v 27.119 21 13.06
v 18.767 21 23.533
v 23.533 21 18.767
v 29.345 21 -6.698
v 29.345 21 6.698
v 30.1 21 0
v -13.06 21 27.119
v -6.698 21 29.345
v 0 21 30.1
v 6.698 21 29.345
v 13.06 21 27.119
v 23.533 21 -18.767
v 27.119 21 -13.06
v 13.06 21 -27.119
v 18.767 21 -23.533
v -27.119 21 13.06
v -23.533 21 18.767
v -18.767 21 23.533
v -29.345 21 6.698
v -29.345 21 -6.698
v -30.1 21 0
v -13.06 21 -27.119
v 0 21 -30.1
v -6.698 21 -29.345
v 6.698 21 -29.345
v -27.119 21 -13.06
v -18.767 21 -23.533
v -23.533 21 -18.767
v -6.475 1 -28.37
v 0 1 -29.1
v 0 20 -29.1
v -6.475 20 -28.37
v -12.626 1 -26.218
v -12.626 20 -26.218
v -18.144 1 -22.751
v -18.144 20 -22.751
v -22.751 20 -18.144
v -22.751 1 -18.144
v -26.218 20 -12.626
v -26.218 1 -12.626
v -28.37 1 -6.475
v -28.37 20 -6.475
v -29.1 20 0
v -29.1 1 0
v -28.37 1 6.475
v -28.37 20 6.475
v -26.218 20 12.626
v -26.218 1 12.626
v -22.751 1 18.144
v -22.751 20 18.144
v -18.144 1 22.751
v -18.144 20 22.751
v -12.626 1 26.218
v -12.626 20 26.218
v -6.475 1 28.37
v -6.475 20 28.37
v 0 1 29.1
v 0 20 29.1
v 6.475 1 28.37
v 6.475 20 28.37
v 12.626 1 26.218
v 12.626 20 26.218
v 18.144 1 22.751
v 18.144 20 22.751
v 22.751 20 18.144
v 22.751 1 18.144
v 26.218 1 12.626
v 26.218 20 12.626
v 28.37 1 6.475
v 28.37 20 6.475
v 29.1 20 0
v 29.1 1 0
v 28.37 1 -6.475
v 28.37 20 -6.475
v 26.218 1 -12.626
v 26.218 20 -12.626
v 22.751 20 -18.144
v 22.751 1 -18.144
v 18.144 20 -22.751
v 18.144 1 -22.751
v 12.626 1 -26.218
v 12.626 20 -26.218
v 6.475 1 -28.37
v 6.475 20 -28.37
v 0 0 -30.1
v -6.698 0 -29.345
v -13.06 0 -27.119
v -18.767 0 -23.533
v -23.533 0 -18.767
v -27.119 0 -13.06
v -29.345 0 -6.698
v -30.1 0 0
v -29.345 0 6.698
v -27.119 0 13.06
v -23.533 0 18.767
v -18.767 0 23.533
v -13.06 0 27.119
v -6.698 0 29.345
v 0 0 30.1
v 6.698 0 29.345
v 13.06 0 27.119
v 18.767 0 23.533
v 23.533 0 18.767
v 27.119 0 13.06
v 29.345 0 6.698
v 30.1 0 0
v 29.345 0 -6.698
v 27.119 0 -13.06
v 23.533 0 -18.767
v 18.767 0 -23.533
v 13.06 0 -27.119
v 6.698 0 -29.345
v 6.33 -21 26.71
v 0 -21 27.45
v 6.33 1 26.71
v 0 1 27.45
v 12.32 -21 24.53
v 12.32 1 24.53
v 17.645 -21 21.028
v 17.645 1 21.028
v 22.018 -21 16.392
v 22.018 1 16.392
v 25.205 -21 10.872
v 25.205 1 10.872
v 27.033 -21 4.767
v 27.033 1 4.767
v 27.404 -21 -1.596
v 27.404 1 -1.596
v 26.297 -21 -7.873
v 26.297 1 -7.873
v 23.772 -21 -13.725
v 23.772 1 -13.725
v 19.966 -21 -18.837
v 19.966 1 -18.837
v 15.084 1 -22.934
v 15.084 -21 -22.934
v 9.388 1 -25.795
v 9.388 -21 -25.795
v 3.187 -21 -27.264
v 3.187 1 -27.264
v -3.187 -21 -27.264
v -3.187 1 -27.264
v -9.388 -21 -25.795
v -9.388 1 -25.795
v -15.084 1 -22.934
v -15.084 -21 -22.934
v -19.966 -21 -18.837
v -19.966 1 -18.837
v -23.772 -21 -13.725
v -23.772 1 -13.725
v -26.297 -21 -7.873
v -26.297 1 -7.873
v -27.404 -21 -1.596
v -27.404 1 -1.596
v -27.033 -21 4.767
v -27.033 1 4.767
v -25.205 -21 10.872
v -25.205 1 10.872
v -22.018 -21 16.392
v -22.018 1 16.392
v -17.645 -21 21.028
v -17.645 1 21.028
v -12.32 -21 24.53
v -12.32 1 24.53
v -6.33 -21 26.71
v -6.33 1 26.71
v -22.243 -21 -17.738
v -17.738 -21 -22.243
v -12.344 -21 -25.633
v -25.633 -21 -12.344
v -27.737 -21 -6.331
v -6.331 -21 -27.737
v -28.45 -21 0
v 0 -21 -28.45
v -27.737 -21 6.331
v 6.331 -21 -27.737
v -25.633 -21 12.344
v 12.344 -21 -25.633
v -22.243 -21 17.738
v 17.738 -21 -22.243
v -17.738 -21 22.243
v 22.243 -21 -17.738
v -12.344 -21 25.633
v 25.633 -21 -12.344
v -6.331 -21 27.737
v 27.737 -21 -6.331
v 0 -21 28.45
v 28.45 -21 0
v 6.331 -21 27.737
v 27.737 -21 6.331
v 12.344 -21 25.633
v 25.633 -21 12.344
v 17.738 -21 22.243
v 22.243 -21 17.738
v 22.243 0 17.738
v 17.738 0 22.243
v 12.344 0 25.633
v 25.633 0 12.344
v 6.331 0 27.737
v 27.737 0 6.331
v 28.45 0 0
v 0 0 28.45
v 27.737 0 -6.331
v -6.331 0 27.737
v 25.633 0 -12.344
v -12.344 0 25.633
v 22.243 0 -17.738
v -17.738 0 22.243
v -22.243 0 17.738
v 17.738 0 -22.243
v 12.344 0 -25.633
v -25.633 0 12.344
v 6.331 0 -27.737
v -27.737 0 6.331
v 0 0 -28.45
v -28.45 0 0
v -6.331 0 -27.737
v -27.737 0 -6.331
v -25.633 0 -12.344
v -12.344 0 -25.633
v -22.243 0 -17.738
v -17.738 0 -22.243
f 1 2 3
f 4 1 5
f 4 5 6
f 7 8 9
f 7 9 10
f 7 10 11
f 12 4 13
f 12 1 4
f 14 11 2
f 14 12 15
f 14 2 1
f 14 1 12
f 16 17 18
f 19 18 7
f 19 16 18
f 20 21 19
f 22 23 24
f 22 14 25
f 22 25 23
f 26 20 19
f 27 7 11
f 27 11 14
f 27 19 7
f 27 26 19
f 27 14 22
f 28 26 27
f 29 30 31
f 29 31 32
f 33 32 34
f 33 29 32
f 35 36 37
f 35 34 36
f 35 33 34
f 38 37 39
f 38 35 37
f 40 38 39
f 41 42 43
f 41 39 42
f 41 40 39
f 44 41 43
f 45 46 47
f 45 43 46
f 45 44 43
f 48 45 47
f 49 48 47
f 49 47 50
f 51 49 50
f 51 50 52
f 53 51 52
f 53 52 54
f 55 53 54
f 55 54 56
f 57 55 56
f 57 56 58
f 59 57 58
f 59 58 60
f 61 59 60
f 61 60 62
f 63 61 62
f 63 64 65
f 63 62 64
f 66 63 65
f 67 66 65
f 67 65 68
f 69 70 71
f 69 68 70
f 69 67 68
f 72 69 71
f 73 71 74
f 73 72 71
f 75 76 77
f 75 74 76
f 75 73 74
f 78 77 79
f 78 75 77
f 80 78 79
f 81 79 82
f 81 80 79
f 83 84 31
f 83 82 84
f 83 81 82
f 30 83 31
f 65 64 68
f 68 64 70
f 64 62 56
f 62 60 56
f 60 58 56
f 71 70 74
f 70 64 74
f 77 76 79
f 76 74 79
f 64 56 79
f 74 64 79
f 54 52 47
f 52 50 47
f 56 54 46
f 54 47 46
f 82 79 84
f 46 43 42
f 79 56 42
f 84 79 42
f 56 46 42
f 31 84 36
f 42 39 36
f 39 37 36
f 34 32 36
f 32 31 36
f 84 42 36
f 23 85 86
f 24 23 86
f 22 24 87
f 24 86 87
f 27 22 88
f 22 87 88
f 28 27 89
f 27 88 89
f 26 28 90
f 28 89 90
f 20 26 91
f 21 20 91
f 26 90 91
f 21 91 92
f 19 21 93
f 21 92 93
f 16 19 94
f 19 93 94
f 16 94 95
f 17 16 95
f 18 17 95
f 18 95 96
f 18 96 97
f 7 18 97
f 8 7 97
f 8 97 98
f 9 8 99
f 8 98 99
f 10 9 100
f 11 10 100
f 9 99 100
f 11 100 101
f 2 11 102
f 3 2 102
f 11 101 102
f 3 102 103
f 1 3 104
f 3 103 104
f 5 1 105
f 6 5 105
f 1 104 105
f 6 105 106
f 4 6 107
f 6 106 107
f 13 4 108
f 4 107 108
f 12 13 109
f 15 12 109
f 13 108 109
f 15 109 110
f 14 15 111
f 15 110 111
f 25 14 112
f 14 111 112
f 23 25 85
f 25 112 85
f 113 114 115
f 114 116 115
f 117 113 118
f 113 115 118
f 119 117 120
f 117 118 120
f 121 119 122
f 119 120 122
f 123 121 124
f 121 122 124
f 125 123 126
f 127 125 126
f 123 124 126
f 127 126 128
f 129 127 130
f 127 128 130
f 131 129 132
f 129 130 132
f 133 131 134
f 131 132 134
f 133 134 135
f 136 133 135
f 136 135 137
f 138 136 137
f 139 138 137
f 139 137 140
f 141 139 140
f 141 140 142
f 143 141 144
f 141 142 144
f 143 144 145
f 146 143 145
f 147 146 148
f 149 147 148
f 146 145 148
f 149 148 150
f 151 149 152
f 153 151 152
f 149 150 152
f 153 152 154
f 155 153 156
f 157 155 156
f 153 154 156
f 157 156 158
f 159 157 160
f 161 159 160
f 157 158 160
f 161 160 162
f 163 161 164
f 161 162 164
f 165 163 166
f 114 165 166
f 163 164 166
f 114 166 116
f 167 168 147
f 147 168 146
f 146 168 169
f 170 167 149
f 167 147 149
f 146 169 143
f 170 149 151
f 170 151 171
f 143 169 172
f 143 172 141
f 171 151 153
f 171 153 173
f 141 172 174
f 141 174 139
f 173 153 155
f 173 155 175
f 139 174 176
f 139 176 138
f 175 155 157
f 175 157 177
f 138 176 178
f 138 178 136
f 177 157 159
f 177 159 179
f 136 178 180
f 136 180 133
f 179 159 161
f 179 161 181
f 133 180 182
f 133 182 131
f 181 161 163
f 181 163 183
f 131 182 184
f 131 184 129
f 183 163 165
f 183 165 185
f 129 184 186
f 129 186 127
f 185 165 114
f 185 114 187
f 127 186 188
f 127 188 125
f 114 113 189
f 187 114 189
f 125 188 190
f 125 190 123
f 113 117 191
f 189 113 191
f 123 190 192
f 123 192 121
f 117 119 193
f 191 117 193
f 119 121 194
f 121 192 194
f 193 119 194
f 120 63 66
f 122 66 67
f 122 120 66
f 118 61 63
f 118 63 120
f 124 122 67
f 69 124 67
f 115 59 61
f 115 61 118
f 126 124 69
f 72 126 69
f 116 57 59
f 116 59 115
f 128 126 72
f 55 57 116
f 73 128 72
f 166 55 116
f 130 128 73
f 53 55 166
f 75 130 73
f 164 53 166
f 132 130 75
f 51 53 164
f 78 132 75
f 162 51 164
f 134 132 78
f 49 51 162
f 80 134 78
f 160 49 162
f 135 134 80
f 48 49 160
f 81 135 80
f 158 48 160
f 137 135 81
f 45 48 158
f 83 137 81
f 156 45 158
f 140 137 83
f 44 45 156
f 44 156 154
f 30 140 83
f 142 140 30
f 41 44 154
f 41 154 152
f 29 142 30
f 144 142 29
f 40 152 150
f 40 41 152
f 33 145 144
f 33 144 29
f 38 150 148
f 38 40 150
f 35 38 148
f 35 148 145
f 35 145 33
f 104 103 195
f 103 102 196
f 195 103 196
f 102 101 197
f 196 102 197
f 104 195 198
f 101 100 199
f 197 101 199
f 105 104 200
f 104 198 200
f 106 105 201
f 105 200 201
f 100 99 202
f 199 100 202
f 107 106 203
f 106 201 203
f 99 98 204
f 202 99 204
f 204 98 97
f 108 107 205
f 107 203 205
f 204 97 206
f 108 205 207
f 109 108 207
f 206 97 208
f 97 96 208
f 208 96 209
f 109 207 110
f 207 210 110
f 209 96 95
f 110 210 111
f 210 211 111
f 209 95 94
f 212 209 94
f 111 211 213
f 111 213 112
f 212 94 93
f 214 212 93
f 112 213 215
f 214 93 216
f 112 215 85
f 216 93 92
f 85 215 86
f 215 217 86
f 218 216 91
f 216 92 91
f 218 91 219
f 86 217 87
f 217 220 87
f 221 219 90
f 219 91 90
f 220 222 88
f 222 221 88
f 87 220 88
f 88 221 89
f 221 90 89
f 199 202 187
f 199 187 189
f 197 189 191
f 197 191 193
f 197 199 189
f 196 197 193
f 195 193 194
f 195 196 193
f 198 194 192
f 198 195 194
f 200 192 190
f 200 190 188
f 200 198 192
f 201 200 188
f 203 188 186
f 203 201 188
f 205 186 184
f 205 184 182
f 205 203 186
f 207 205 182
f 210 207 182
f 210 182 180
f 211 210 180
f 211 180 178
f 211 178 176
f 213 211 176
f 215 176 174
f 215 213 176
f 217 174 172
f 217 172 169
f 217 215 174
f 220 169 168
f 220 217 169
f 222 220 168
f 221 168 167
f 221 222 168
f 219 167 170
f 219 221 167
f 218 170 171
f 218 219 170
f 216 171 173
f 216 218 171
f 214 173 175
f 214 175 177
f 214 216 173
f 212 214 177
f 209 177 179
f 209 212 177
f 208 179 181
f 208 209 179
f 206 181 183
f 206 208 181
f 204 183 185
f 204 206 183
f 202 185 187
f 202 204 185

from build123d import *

# Parameters (mm, degrees)
SKETCH1_R           = 30.1
BOSS_EXTRUDE1_DEPTH = 21
SKETCH1_3_R         = 28.45
BOSS_EXTRUDE2_DEPTH = 21
SHELL1_T            = -1


with BuildPart() as part:
    # Sketch1 → Boss-Extrude1 (new body)
    with BuildSketch(Plane(origin=(0, 0, 0), x_dir=(1, 0, 0), z_dir=(0, 1, 0))):
        Circle(SKETCH1_R)
    extrude(amount=BOSS_EXTRUDE1_DEPTH)

    # Sketch1<3> → Boss-Extrude2 (add)
    with BuildSketch(Plane(origin=(0, 0, 0), x_dir=(1, 0, 0), z_dir=(0, 1, 0))):
        Circle(SKETCH1_3_R)
    extrude(amount=-BOSS_EXTRUDE2_DEPTH)

    # Shell1
    shell1_openings = [part.faces().sort_by_distance(p)[0] for p in [
        (0, -21, 0),
    ]]
    offset(amount=SHELL1_T, openings=shell1_openings, kind=Kind.INTERSECTION)


solid = part.part
